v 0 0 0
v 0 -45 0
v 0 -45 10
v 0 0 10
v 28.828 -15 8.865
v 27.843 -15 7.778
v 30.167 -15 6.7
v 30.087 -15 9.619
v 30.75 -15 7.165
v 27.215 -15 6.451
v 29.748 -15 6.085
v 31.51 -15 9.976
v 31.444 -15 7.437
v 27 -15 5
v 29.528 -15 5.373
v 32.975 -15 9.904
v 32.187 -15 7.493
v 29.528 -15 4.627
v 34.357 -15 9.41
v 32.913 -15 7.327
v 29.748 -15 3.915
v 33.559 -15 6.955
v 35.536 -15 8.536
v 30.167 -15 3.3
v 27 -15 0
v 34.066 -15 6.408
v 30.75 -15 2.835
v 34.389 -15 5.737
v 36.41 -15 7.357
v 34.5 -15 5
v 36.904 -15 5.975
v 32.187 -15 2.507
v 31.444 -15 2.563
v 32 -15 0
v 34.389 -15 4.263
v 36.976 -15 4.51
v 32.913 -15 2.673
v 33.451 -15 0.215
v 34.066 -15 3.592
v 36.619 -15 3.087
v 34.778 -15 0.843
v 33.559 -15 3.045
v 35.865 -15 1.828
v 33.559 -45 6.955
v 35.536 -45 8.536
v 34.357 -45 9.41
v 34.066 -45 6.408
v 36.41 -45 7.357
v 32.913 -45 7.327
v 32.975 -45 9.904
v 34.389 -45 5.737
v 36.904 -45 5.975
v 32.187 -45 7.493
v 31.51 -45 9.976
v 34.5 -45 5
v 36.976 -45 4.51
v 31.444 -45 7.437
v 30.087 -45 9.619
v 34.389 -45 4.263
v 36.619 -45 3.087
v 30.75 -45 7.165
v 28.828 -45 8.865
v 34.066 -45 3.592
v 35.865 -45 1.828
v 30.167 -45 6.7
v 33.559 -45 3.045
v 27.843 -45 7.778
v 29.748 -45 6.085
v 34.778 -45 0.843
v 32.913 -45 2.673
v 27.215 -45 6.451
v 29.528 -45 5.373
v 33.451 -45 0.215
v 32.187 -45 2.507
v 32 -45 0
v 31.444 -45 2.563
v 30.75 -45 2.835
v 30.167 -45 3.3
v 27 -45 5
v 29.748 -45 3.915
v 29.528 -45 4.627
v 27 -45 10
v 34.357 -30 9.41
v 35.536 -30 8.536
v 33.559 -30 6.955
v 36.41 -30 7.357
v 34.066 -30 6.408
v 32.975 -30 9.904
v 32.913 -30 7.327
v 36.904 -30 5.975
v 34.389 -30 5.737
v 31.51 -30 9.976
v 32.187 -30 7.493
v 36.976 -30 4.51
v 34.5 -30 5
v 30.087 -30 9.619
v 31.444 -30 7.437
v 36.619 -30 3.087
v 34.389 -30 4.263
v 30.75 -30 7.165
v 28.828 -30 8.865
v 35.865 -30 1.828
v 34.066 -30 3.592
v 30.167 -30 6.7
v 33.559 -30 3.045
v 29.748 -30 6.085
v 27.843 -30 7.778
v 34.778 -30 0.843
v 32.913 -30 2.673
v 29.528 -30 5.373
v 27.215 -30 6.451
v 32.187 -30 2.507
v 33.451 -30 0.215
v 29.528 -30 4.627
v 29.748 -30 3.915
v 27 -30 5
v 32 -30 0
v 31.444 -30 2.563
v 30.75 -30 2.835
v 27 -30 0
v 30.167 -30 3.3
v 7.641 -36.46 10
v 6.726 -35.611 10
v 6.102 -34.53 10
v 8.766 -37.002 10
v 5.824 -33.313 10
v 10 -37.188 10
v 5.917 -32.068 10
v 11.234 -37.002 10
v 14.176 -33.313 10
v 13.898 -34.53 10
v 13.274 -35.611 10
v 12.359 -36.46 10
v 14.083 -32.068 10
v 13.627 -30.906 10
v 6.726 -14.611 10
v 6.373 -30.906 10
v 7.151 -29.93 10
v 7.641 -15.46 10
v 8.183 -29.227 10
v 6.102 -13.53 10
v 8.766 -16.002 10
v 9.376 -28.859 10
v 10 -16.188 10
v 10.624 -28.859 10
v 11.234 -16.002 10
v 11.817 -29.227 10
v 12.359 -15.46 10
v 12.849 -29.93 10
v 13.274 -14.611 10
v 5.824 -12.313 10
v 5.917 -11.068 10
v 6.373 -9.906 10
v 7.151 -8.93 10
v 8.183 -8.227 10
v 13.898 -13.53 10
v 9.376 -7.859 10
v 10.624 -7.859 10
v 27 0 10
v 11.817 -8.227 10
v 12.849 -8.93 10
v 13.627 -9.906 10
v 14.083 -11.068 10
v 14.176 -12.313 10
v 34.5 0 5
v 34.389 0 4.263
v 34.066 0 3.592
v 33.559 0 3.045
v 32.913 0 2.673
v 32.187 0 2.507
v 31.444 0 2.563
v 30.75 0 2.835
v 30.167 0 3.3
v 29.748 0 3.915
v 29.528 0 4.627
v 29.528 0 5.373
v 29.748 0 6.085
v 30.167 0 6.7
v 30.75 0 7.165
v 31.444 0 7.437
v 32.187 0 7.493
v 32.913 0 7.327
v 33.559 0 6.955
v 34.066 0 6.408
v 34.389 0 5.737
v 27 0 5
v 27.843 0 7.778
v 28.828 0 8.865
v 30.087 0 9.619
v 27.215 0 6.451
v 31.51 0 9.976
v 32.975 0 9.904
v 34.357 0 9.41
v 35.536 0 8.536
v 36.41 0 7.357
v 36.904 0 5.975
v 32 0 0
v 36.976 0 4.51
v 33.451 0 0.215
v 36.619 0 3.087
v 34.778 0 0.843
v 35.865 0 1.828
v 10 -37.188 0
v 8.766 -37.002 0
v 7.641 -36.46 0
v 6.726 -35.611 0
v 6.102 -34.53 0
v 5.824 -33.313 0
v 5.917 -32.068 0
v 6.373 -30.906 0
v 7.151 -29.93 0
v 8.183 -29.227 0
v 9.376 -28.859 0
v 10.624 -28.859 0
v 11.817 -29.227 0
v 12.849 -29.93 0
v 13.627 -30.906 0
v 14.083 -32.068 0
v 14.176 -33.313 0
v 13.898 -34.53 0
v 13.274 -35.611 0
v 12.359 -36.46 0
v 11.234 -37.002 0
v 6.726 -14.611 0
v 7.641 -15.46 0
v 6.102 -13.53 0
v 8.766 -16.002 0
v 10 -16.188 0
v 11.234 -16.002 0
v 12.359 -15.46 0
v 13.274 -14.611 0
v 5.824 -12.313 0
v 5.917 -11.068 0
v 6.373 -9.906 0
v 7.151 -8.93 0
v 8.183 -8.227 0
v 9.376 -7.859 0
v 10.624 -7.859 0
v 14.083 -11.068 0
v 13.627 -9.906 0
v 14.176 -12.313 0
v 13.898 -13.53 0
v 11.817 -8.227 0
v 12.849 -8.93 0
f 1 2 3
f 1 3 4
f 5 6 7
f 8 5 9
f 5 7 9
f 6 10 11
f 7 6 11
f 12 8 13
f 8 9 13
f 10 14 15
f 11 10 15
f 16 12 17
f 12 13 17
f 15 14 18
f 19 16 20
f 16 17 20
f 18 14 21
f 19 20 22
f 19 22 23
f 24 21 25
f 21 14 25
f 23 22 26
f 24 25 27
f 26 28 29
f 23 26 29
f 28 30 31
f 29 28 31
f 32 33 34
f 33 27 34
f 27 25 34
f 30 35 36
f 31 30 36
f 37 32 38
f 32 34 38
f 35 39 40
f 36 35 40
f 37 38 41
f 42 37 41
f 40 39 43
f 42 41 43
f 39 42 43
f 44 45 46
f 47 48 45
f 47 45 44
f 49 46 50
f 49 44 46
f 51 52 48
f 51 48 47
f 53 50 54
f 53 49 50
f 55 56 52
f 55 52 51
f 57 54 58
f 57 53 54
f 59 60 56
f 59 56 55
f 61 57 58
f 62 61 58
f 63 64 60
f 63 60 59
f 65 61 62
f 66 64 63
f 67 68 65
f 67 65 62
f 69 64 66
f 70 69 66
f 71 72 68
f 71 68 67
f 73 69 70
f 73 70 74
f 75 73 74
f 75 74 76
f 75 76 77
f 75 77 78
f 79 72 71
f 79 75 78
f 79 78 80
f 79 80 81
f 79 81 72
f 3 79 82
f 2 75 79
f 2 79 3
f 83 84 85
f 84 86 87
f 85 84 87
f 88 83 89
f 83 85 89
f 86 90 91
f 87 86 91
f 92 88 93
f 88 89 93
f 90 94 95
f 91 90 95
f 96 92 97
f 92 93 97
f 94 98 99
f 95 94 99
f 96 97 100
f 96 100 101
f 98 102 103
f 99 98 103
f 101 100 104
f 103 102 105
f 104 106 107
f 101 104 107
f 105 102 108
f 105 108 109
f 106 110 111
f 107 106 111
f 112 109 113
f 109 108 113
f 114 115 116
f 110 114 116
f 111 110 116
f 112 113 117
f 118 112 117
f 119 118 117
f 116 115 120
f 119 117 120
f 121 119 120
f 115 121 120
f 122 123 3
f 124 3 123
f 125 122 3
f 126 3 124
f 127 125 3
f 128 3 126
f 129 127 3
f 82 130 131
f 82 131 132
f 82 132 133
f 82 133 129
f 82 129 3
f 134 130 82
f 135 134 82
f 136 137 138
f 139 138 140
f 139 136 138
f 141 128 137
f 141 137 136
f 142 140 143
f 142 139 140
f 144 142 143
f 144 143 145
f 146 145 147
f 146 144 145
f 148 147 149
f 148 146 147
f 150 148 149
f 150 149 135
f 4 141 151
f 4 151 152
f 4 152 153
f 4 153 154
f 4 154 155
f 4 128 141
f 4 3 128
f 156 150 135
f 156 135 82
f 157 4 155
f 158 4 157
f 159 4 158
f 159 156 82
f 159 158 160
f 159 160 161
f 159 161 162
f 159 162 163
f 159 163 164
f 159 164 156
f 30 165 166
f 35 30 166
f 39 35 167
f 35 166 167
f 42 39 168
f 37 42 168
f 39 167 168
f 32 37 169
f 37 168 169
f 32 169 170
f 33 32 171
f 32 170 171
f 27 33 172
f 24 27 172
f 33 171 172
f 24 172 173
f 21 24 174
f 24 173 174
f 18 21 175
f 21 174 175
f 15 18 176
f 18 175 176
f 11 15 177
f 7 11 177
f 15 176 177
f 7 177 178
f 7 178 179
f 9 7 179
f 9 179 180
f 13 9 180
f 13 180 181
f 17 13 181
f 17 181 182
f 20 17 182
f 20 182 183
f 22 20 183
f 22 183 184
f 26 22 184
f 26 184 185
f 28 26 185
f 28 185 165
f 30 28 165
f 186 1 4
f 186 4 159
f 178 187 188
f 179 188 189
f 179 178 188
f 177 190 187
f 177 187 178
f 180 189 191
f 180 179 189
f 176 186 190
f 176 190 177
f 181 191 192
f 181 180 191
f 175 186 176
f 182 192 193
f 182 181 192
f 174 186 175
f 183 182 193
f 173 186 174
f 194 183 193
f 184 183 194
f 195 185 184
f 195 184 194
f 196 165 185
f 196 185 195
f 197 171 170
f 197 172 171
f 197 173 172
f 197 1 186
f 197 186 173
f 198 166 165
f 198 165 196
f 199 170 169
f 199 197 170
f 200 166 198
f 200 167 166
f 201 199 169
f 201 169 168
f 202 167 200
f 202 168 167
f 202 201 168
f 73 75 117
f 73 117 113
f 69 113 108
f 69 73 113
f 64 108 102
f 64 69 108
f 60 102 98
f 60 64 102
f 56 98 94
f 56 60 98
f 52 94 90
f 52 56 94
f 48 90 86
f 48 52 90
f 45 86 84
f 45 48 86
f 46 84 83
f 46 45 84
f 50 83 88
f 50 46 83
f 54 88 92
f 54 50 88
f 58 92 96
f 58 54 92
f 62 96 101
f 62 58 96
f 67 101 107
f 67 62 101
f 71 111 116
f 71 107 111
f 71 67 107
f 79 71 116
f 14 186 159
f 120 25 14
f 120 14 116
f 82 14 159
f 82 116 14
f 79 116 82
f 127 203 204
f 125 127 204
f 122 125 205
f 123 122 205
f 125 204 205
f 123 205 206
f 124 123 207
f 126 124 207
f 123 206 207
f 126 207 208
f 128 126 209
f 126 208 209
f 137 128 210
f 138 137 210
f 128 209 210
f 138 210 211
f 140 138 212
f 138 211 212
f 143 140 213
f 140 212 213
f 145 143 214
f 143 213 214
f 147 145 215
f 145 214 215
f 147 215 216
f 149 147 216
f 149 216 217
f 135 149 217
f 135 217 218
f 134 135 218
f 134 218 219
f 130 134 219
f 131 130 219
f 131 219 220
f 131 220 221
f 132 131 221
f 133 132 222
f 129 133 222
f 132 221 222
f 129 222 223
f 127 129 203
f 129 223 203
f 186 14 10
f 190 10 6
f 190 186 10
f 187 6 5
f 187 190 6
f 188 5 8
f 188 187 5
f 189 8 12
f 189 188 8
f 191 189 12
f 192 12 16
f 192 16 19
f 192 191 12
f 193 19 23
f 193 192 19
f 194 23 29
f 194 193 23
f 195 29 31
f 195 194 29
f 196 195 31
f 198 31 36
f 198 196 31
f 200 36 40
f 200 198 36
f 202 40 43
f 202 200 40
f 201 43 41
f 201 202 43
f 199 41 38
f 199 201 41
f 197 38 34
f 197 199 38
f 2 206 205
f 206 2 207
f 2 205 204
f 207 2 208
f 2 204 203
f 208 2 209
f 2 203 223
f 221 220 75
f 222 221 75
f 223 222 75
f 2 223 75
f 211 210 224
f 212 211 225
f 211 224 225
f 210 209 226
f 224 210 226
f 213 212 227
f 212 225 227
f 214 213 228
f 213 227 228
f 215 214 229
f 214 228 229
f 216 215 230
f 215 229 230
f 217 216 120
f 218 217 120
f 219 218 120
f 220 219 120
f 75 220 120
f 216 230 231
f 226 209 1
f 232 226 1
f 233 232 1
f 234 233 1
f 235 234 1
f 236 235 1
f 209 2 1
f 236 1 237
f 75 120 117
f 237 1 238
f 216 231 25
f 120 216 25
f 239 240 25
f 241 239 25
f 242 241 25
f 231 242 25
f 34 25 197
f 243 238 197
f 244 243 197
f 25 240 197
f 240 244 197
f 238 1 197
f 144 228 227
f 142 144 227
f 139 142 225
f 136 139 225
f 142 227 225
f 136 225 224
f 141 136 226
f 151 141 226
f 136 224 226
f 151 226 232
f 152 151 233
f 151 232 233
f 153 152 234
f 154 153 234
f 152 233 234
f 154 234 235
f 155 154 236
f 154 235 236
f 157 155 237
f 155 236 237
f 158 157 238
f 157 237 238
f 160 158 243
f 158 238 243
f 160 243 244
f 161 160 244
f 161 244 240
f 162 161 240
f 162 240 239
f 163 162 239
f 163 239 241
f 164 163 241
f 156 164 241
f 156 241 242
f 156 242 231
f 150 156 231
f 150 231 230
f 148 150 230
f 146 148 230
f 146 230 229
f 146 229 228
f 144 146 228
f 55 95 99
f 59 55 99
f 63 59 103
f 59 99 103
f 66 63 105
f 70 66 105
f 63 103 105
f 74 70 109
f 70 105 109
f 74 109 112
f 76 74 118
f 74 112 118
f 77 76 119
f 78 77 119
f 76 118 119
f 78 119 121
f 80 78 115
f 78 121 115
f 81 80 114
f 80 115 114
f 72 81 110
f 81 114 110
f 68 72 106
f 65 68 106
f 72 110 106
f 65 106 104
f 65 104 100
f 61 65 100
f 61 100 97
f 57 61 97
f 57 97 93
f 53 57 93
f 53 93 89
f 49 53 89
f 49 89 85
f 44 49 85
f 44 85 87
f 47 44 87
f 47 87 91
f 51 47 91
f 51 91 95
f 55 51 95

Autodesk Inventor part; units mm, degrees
ref_plane "YZ Plane" through (0, 0, 0) normal (1, 0, 0) x (0, 1, 0)
ref_plane "XZ Plane" through (0, 0, 0) normal (0, 1, 0) x (-1, 0, 0)
ref_plane "XY Plane" through (0, 0, 0) normal (0, 0, 1) x (1, 0, 0)
sketch "草图1" plane through (0, 0, 0) normal (0, 0, 1) x (1, 0, 0)
  line L0 (0, 0) -> (27, 0)
  line L1 (27, 0) -> (27, -45)
  line L2 (27, -45) -> (0, -45)
  line L3 (0, -45) -> (0, 0)
  dimension "d0" = 27
  dimension "d1" = 45
extrude "拉伸1" add sketch "草图1" along normal blind 10
sketch "草图2" plane through (0, 0, 0) normal (0, 1, 0) x (1, 0, 0)
  circle A0 centre (32, -5) radius 5
  line L0 (27, -10) -> (0, -10) projected
  line L1 (27, 0) -> (27, -10) projected
  line L2 (0, 0) -> (27, 0) projected
  line L3 (32, 0) -> (27, 0)
  line L4 (27, 0) -> (27, -10) projected
  line L5 (27, -5) -> (27, 0)
  dimension "d4" = 10
  dimension "d5" = 5
  dimension "d6" = 5
extrude "拉伸2" add sketch "草图2" against normal blind 15
sketch "草图3" plane through (0, 0, 10) normal (0, 1, 0) x (1, 0, 0)
  arc A0 (27, 5) -> (32, 10) centre (32, 5) ccw projected
  circle A1 centre (32, 5) radius 2.5
  point P0 (0, 10)
  dimension "d9" = 5
ref_plane "工作平面1" through (0, -22.5, 0) normal (0, -1, 0) x (1, 0, 0)
mirror "镜像1" about plane through (0, -22.5, 0) normal (0, -1, 0) of "拉伸2"
extrude "拉伸3" cut sketch "草图3" against normal up to surface (45 mm away)
sketch "草图4" plane through (0, 0, 10) normal (0, 0, 1) x (1, 0, 0)
  line L0 (27, 0) -> (0, 0) projected
  line L1 (0, -45) -> (27, -45) projected
  line L2 (0, 0) -> (0, -45) projected
  point P0 (10, -12)
  point P1 (10, -33)
  dimension "d12" = 12
  dimension "d13" = 12
  dimension "d14" = 10
  dimension "d15" = 10
hole "孔1" at (10, -12, 10) at (10, -33, 10) direction (0, 0, -1) diameter 8.376 depth 27.3 thread size "M10x1.5" designation "M10" class "6H" standard "GB Metric profile"
properties part number "连接块"
